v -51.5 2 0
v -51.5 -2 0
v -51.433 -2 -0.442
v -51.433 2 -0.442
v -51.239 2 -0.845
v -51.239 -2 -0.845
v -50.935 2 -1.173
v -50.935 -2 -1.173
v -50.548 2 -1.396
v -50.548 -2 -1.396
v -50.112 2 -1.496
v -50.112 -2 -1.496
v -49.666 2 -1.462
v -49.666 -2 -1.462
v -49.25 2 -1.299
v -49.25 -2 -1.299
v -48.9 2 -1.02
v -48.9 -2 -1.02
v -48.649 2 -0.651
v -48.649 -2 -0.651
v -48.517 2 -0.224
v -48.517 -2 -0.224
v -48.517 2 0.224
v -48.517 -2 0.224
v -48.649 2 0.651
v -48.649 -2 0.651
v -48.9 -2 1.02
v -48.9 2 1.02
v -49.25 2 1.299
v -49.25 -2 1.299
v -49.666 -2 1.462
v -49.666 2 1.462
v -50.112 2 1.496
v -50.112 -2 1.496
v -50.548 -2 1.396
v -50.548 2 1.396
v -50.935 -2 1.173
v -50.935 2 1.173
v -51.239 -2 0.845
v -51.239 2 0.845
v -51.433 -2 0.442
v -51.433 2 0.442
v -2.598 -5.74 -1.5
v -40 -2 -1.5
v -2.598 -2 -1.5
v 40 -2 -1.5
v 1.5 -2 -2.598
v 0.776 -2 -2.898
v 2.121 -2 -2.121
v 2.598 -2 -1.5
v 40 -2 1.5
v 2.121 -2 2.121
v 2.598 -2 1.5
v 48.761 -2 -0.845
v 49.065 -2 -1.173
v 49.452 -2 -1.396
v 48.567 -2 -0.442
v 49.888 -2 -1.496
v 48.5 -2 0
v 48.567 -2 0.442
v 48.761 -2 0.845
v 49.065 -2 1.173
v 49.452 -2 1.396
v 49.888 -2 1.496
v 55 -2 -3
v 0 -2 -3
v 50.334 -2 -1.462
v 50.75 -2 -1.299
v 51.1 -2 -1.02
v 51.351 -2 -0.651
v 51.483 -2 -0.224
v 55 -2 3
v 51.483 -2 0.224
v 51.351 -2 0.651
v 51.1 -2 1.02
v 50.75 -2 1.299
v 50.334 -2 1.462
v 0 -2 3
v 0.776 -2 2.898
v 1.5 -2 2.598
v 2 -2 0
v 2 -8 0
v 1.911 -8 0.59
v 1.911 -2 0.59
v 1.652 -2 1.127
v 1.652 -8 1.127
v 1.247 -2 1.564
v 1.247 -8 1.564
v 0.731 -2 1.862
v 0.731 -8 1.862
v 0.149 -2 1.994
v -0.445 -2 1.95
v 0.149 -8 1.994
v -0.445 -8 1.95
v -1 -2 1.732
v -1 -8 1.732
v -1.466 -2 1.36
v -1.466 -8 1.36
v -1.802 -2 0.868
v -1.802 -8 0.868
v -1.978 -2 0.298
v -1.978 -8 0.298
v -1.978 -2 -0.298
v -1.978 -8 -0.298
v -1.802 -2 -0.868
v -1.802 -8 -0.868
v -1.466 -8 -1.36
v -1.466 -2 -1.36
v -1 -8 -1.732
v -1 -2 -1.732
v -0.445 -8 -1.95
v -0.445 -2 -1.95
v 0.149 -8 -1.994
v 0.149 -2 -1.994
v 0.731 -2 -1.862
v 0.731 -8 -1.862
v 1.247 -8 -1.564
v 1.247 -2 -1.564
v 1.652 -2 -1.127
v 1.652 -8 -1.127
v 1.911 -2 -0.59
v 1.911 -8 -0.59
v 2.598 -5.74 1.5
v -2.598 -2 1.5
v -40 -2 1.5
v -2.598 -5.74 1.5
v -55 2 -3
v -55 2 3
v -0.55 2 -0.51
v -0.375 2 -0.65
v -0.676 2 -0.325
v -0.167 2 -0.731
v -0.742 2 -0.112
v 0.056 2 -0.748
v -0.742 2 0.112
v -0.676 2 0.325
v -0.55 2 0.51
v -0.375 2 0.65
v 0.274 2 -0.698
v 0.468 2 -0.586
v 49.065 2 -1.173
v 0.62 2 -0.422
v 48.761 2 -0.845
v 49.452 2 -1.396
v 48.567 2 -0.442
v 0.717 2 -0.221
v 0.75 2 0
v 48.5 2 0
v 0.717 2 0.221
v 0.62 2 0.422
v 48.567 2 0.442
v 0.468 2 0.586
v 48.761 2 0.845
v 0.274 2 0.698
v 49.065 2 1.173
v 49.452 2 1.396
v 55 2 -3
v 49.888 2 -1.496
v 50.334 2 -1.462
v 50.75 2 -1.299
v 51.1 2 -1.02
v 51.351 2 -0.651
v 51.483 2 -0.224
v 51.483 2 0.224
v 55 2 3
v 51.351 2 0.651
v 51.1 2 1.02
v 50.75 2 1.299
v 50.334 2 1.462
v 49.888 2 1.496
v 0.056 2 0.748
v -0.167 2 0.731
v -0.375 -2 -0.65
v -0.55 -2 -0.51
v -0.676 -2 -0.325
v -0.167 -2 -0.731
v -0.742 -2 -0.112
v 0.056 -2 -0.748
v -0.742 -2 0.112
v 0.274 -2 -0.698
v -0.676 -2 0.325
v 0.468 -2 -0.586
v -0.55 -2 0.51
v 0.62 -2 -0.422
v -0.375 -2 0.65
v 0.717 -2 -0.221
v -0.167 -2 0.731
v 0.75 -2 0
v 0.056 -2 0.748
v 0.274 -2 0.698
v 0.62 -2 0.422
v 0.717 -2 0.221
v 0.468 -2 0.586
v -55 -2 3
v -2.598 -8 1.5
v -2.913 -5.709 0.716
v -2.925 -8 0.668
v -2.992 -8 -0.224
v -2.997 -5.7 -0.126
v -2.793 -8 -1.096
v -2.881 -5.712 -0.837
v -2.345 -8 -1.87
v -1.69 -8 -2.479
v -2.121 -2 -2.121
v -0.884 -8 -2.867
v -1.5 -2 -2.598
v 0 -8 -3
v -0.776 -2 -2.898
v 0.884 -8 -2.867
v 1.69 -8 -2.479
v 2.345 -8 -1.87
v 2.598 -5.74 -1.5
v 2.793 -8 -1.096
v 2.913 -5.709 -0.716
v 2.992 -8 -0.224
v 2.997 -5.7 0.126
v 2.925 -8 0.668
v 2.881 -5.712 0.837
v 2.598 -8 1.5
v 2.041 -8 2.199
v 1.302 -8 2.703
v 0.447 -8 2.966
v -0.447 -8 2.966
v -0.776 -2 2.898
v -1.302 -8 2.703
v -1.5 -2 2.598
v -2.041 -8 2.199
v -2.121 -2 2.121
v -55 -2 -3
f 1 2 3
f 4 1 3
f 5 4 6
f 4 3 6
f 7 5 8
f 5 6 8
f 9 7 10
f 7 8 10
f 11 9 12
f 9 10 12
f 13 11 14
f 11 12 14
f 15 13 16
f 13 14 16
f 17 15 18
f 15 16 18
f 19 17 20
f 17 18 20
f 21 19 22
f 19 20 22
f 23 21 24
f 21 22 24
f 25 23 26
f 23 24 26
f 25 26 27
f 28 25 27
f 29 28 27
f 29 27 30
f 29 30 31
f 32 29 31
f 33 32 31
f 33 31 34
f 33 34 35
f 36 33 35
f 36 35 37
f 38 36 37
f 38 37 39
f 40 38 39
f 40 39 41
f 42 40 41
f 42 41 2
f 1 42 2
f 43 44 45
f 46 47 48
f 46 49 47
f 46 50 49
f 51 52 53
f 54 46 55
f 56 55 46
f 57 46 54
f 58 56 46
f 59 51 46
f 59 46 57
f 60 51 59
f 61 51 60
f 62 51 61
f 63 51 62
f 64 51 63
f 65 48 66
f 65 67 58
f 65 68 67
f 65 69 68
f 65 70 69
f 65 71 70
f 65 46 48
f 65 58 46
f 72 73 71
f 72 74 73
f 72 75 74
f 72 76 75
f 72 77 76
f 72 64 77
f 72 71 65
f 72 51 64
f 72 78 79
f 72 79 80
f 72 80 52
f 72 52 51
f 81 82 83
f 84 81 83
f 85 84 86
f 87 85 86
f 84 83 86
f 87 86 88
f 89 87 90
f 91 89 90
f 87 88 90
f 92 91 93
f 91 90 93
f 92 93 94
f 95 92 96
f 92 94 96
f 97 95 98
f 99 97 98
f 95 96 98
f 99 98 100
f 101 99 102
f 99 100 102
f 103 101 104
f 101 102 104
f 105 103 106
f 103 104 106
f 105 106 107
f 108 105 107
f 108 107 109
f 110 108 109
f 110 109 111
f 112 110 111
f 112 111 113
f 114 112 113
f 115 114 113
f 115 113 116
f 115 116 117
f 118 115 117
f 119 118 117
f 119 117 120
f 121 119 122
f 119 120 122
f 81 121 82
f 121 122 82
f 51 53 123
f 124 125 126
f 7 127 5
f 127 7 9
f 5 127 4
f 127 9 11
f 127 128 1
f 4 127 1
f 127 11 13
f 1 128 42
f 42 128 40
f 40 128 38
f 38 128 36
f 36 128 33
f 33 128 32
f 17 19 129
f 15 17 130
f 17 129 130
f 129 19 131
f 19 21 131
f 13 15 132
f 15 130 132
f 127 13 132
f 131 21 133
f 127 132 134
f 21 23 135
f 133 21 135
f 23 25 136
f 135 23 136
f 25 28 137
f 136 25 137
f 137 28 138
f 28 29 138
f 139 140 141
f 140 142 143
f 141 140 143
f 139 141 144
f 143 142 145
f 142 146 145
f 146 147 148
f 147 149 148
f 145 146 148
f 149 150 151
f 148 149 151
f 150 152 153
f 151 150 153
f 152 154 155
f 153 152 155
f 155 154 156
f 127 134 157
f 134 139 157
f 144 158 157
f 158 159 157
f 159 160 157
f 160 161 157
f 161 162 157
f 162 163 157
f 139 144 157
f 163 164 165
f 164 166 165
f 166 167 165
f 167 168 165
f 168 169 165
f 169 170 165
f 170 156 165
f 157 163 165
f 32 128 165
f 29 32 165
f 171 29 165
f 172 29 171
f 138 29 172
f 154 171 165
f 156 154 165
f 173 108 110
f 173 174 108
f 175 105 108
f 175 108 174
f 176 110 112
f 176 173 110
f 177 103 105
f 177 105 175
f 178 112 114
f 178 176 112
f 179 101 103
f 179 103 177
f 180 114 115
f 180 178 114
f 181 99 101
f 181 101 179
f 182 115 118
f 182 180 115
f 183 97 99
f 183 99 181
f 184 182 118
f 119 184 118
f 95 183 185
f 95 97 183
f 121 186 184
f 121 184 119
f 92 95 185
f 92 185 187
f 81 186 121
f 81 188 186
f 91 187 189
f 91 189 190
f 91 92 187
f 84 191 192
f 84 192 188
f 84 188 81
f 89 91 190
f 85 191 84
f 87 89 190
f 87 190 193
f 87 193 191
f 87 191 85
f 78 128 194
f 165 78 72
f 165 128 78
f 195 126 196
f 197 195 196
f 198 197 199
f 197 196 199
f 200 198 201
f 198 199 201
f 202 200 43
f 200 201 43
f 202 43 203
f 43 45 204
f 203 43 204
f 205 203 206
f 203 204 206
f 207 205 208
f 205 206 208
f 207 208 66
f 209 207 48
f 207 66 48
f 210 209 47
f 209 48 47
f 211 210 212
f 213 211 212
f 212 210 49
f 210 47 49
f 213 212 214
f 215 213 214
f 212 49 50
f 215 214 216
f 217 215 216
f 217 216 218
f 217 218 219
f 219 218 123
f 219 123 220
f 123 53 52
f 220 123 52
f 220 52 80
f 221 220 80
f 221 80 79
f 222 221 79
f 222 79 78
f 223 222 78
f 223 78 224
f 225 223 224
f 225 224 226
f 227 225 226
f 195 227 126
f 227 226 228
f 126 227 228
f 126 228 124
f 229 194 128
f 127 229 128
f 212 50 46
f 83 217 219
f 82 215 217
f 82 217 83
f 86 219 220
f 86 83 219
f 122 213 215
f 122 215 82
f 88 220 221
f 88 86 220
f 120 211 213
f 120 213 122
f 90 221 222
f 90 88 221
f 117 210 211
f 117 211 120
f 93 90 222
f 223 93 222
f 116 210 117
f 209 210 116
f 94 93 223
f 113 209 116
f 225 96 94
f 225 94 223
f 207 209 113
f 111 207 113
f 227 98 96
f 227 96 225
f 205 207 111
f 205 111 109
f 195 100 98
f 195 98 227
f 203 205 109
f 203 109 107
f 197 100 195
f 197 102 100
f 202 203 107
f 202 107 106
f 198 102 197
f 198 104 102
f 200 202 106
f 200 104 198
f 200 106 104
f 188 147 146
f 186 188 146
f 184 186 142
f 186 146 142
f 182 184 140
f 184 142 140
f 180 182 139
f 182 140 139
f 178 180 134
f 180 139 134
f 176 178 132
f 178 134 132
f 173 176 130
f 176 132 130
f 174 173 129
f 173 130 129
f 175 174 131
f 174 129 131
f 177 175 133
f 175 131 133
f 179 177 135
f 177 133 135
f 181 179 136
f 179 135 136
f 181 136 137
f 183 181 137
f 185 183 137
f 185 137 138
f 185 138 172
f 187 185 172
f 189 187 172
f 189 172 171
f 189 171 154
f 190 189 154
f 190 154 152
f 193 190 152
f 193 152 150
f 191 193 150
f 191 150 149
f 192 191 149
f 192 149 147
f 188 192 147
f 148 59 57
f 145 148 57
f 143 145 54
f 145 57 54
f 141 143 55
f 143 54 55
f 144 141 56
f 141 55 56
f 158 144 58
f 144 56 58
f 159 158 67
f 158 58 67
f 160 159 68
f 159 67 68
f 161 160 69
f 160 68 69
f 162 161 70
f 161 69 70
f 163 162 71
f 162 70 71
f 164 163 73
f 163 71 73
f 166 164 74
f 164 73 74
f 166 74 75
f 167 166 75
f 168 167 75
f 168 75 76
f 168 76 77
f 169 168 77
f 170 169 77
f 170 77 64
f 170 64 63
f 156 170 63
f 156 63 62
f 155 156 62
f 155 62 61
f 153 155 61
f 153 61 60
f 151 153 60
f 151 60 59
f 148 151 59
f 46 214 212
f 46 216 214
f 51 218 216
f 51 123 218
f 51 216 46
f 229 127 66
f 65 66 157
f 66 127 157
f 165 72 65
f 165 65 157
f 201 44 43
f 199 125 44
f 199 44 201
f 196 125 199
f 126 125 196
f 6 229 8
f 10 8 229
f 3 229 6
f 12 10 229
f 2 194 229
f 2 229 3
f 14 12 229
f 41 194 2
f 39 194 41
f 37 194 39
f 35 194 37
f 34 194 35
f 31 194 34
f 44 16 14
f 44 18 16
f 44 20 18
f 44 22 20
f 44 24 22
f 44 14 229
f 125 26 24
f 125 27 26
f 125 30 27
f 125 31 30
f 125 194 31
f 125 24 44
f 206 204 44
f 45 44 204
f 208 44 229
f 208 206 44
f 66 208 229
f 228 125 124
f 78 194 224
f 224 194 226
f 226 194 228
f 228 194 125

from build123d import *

# Parameters (mm, degrees)
SKETCH1_W                  = 110
SKETCH1_H                  = 4
BOSS_EXTRUDE1_DEPTH        = 3
BOSS_EXTRUDE2_DEPTH        = 1.5
F_3_0_3_DIAMETER_HOLE1_D   = 3
SKETCH5_R                  = 3
BOSS_EXTRUDE3_DEPTH        = 6
F_1_5_1_5_DIAMETER_HOLE1_D = 1.5
SKETCH8_R                  = 2
CUT_EXTRUDE1_DEPTH         = 6


with BuildPart() as part:
    # Sketch1 → Boss-Extrude1 (new, symmetric)
    with BuildSketch(Plane.XY):
        Rectangle(SKETCH1_W, SKETCH1_H)
    extrude(amount=BOSS_EXTRUDE1_DEPTH, both=True)

    # Sketch2 → Boss-Extrude2 (add, symmetric)
    with BuildSketch(Plane.XY):
        Polygon((-40, -2), (0, -6), (40, -2), align=None)
    extrude(amount=BOSS_EXTRUDE2_DEPTH, both=True)

    # Ø3.0 (3) Diameter Hole1 (through all)
    with Locations(Plane(origin=(0, 2, 0), x_dir=(1, 0, 0), z_dir=(0, 1, 0))):
        with Locations((-50, 0), (50, 0)):
            Hole(F_3_0_3_DIAMETER_HOLE1_D / 2)

    # Sketch5 → Boss-Extrude3 (add)
    with BuildSketch(Plane.XZ.offset(2)):
        with Locations(Location((0, 0, 0), (0, 0, 150))):
            Circle(SKETCH5_R)
    extrude(amount=BOSS_EXTRUDE3_DEPTH)

    # Ø1.5 (1.5) Diameter Hole1 (through all)
    with Locations(Plane(origin=(0, -8, 0), x_dir=(-1, 0, 0), z_dir=(0, -1, 0))):
        with Locations((0, 0)):
            Hole(F_1_5_1_5_DIAMETER_HOLE1_D / 2)

    # Sketch8 → Cut-Extrude1 (cut)
    with BuildSketch(Plane.XZ.offset(8)):
        Circle(SKETCH8_R)
    extrude(amount=-CUT_EXTRUDE1_DEPTH, mode=Mode.SUBTRACT)


solid = part.part
